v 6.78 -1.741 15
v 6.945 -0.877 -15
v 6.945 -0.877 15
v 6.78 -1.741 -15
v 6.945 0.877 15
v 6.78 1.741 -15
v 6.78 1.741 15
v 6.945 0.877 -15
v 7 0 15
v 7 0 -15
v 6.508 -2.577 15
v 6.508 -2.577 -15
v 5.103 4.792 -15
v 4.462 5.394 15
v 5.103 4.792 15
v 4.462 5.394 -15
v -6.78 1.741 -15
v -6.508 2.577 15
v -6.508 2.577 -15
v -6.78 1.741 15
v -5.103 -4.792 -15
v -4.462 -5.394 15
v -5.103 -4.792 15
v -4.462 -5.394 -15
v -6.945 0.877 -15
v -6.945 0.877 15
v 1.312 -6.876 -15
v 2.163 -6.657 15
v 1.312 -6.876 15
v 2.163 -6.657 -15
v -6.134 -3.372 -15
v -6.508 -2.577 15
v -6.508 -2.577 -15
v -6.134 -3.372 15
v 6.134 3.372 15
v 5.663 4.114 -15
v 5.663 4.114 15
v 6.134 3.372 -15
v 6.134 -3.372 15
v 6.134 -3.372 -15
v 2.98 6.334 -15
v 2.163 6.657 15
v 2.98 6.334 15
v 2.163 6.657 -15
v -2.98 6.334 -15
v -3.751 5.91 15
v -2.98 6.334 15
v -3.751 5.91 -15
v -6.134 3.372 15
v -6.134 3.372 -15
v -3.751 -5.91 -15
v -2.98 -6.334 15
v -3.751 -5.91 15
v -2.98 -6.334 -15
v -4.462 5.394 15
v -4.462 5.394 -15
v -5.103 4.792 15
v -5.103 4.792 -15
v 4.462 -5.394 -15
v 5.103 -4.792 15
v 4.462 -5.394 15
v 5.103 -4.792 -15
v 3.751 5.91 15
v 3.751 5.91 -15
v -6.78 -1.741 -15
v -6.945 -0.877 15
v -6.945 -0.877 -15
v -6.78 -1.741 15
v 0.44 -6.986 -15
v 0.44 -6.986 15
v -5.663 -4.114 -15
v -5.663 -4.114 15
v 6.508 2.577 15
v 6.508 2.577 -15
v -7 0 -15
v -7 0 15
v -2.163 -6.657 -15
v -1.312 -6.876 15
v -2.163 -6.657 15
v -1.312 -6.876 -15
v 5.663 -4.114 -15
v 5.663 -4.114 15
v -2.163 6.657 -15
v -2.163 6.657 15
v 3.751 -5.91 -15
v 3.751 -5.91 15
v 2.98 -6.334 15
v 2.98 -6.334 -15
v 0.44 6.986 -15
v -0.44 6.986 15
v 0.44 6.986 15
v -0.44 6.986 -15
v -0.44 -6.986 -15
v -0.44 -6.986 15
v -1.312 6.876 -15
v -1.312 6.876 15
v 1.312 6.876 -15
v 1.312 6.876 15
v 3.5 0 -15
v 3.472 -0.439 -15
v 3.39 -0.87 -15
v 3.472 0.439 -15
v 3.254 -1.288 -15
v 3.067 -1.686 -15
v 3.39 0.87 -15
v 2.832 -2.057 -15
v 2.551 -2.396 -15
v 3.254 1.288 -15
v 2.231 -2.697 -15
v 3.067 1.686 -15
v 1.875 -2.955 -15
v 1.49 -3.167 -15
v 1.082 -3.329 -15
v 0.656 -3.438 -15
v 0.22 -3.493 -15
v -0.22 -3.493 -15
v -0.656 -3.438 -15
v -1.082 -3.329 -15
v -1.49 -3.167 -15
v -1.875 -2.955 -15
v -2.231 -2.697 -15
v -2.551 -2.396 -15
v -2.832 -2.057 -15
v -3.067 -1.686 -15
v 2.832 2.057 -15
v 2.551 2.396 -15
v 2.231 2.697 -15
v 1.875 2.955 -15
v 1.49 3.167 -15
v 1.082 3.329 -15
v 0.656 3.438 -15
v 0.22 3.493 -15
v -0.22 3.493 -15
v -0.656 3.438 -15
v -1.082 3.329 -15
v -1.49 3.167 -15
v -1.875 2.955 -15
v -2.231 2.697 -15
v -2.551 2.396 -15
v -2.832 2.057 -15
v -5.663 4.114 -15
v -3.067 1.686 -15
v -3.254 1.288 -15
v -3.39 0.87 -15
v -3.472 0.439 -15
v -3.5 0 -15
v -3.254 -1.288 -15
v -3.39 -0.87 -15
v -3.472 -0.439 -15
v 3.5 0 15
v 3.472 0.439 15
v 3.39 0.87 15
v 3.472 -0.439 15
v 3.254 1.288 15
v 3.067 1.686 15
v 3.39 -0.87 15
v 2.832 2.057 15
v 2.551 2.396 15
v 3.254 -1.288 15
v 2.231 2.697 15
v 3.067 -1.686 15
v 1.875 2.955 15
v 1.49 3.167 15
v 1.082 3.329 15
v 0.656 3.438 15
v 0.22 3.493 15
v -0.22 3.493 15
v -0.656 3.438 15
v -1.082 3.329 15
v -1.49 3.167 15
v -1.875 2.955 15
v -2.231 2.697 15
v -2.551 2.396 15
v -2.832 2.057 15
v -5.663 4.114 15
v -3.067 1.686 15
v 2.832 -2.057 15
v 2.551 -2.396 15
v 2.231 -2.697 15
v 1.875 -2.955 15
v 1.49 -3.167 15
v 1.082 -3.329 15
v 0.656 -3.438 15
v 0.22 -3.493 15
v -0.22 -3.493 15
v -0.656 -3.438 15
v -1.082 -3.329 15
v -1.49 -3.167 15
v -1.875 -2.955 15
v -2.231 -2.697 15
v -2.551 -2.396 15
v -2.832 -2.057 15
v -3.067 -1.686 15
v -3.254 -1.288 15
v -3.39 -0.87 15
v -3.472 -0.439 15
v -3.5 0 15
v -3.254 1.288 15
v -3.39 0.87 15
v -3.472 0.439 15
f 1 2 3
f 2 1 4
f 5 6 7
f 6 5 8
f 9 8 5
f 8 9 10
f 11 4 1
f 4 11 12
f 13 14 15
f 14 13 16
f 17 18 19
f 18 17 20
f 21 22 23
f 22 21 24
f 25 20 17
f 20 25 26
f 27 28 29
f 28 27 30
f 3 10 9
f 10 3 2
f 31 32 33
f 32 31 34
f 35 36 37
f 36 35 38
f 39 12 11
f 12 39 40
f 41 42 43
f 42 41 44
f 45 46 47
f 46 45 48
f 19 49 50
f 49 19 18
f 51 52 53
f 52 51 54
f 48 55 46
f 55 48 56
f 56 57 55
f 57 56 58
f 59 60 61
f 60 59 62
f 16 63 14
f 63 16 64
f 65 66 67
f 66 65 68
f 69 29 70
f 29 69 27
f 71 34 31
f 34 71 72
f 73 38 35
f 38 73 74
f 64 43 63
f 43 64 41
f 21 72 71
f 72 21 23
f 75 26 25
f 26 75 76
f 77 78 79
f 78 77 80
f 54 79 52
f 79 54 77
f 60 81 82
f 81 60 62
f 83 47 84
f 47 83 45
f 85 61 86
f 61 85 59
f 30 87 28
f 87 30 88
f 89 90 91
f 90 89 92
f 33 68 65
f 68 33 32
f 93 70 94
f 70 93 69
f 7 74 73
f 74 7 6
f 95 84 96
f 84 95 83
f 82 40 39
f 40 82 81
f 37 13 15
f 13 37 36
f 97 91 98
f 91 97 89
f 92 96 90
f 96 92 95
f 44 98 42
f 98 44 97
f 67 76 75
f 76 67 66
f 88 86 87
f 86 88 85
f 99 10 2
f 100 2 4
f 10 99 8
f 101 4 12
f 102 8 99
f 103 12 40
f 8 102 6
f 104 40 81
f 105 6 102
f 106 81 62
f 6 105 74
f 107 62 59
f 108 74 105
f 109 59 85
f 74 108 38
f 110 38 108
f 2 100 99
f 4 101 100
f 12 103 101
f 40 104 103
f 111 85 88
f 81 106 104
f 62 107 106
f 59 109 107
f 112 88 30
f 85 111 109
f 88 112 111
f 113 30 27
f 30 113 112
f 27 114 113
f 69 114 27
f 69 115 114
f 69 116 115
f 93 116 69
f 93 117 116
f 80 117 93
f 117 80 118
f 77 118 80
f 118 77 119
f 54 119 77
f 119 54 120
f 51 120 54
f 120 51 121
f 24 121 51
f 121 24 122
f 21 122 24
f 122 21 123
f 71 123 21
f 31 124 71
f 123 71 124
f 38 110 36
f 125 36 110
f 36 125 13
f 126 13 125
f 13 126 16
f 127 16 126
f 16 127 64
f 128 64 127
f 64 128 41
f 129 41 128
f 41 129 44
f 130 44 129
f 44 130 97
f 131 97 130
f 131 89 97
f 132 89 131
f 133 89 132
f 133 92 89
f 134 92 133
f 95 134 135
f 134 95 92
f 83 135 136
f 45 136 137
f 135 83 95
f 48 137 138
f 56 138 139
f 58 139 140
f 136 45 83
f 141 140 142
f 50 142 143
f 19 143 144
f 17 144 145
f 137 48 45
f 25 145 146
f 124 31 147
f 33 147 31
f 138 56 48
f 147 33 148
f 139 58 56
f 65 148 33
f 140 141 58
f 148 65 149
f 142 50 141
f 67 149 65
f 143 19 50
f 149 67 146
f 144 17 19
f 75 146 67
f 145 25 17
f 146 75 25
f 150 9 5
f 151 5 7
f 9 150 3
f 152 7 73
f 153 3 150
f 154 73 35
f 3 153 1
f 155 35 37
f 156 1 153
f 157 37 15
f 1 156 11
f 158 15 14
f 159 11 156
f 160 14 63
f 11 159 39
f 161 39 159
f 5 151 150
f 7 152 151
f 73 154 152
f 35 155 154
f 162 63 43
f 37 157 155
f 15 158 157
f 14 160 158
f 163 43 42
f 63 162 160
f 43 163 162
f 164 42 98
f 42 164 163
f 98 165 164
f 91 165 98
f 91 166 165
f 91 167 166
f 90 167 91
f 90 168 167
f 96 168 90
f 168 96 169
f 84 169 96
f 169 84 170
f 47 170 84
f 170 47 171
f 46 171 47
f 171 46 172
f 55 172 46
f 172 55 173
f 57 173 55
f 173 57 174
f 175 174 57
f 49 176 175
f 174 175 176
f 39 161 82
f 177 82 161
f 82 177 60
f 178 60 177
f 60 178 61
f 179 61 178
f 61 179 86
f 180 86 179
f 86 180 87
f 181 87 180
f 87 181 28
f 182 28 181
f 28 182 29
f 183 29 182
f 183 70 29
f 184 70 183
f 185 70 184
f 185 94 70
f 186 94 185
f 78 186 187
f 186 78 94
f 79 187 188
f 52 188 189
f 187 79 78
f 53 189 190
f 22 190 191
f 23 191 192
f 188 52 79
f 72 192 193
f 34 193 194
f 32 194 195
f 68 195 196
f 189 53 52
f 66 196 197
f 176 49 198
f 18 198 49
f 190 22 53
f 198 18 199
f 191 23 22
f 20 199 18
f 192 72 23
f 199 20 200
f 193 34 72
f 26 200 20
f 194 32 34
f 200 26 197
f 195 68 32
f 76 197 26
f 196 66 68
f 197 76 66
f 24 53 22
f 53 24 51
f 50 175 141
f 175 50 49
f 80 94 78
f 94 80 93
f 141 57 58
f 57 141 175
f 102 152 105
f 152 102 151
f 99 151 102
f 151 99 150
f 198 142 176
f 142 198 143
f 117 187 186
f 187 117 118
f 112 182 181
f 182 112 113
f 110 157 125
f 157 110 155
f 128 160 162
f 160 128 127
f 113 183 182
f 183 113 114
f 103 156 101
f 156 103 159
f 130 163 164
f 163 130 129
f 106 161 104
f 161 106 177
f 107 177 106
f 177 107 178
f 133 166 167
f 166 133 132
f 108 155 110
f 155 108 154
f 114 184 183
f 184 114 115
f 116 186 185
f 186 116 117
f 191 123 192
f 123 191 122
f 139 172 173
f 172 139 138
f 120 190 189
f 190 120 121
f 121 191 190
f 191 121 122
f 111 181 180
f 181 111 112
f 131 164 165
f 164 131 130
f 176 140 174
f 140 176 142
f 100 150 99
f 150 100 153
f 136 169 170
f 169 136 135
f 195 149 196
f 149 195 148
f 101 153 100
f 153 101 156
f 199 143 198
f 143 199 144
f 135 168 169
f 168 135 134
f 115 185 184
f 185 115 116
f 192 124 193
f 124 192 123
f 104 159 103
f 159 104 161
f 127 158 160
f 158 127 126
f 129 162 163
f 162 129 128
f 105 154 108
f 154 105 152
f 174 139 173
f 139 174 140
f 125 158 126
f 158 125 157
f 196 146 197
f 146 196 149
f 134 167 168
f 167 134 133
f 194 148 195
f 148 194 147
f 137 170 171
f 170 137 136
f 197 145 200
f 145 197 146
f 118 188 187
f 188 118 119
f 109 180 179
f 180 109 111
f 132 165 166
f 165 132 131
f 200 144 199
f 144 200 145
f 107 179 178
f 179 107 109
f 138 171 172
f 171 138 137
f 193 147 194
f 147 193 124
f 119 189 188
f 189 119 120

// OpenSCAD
$fn = 50;


difference() {
	union() {
		translate(v = [0, 0, -15.0000000000]) {
			cylinder(h = 30, r = 7.0000000000);
		}
	}
	union() {
		translate(v = [0, 0, -100.0000000000]) {
			cylinder(h = 200, r = 3.5000000000);
		}
	}
}
